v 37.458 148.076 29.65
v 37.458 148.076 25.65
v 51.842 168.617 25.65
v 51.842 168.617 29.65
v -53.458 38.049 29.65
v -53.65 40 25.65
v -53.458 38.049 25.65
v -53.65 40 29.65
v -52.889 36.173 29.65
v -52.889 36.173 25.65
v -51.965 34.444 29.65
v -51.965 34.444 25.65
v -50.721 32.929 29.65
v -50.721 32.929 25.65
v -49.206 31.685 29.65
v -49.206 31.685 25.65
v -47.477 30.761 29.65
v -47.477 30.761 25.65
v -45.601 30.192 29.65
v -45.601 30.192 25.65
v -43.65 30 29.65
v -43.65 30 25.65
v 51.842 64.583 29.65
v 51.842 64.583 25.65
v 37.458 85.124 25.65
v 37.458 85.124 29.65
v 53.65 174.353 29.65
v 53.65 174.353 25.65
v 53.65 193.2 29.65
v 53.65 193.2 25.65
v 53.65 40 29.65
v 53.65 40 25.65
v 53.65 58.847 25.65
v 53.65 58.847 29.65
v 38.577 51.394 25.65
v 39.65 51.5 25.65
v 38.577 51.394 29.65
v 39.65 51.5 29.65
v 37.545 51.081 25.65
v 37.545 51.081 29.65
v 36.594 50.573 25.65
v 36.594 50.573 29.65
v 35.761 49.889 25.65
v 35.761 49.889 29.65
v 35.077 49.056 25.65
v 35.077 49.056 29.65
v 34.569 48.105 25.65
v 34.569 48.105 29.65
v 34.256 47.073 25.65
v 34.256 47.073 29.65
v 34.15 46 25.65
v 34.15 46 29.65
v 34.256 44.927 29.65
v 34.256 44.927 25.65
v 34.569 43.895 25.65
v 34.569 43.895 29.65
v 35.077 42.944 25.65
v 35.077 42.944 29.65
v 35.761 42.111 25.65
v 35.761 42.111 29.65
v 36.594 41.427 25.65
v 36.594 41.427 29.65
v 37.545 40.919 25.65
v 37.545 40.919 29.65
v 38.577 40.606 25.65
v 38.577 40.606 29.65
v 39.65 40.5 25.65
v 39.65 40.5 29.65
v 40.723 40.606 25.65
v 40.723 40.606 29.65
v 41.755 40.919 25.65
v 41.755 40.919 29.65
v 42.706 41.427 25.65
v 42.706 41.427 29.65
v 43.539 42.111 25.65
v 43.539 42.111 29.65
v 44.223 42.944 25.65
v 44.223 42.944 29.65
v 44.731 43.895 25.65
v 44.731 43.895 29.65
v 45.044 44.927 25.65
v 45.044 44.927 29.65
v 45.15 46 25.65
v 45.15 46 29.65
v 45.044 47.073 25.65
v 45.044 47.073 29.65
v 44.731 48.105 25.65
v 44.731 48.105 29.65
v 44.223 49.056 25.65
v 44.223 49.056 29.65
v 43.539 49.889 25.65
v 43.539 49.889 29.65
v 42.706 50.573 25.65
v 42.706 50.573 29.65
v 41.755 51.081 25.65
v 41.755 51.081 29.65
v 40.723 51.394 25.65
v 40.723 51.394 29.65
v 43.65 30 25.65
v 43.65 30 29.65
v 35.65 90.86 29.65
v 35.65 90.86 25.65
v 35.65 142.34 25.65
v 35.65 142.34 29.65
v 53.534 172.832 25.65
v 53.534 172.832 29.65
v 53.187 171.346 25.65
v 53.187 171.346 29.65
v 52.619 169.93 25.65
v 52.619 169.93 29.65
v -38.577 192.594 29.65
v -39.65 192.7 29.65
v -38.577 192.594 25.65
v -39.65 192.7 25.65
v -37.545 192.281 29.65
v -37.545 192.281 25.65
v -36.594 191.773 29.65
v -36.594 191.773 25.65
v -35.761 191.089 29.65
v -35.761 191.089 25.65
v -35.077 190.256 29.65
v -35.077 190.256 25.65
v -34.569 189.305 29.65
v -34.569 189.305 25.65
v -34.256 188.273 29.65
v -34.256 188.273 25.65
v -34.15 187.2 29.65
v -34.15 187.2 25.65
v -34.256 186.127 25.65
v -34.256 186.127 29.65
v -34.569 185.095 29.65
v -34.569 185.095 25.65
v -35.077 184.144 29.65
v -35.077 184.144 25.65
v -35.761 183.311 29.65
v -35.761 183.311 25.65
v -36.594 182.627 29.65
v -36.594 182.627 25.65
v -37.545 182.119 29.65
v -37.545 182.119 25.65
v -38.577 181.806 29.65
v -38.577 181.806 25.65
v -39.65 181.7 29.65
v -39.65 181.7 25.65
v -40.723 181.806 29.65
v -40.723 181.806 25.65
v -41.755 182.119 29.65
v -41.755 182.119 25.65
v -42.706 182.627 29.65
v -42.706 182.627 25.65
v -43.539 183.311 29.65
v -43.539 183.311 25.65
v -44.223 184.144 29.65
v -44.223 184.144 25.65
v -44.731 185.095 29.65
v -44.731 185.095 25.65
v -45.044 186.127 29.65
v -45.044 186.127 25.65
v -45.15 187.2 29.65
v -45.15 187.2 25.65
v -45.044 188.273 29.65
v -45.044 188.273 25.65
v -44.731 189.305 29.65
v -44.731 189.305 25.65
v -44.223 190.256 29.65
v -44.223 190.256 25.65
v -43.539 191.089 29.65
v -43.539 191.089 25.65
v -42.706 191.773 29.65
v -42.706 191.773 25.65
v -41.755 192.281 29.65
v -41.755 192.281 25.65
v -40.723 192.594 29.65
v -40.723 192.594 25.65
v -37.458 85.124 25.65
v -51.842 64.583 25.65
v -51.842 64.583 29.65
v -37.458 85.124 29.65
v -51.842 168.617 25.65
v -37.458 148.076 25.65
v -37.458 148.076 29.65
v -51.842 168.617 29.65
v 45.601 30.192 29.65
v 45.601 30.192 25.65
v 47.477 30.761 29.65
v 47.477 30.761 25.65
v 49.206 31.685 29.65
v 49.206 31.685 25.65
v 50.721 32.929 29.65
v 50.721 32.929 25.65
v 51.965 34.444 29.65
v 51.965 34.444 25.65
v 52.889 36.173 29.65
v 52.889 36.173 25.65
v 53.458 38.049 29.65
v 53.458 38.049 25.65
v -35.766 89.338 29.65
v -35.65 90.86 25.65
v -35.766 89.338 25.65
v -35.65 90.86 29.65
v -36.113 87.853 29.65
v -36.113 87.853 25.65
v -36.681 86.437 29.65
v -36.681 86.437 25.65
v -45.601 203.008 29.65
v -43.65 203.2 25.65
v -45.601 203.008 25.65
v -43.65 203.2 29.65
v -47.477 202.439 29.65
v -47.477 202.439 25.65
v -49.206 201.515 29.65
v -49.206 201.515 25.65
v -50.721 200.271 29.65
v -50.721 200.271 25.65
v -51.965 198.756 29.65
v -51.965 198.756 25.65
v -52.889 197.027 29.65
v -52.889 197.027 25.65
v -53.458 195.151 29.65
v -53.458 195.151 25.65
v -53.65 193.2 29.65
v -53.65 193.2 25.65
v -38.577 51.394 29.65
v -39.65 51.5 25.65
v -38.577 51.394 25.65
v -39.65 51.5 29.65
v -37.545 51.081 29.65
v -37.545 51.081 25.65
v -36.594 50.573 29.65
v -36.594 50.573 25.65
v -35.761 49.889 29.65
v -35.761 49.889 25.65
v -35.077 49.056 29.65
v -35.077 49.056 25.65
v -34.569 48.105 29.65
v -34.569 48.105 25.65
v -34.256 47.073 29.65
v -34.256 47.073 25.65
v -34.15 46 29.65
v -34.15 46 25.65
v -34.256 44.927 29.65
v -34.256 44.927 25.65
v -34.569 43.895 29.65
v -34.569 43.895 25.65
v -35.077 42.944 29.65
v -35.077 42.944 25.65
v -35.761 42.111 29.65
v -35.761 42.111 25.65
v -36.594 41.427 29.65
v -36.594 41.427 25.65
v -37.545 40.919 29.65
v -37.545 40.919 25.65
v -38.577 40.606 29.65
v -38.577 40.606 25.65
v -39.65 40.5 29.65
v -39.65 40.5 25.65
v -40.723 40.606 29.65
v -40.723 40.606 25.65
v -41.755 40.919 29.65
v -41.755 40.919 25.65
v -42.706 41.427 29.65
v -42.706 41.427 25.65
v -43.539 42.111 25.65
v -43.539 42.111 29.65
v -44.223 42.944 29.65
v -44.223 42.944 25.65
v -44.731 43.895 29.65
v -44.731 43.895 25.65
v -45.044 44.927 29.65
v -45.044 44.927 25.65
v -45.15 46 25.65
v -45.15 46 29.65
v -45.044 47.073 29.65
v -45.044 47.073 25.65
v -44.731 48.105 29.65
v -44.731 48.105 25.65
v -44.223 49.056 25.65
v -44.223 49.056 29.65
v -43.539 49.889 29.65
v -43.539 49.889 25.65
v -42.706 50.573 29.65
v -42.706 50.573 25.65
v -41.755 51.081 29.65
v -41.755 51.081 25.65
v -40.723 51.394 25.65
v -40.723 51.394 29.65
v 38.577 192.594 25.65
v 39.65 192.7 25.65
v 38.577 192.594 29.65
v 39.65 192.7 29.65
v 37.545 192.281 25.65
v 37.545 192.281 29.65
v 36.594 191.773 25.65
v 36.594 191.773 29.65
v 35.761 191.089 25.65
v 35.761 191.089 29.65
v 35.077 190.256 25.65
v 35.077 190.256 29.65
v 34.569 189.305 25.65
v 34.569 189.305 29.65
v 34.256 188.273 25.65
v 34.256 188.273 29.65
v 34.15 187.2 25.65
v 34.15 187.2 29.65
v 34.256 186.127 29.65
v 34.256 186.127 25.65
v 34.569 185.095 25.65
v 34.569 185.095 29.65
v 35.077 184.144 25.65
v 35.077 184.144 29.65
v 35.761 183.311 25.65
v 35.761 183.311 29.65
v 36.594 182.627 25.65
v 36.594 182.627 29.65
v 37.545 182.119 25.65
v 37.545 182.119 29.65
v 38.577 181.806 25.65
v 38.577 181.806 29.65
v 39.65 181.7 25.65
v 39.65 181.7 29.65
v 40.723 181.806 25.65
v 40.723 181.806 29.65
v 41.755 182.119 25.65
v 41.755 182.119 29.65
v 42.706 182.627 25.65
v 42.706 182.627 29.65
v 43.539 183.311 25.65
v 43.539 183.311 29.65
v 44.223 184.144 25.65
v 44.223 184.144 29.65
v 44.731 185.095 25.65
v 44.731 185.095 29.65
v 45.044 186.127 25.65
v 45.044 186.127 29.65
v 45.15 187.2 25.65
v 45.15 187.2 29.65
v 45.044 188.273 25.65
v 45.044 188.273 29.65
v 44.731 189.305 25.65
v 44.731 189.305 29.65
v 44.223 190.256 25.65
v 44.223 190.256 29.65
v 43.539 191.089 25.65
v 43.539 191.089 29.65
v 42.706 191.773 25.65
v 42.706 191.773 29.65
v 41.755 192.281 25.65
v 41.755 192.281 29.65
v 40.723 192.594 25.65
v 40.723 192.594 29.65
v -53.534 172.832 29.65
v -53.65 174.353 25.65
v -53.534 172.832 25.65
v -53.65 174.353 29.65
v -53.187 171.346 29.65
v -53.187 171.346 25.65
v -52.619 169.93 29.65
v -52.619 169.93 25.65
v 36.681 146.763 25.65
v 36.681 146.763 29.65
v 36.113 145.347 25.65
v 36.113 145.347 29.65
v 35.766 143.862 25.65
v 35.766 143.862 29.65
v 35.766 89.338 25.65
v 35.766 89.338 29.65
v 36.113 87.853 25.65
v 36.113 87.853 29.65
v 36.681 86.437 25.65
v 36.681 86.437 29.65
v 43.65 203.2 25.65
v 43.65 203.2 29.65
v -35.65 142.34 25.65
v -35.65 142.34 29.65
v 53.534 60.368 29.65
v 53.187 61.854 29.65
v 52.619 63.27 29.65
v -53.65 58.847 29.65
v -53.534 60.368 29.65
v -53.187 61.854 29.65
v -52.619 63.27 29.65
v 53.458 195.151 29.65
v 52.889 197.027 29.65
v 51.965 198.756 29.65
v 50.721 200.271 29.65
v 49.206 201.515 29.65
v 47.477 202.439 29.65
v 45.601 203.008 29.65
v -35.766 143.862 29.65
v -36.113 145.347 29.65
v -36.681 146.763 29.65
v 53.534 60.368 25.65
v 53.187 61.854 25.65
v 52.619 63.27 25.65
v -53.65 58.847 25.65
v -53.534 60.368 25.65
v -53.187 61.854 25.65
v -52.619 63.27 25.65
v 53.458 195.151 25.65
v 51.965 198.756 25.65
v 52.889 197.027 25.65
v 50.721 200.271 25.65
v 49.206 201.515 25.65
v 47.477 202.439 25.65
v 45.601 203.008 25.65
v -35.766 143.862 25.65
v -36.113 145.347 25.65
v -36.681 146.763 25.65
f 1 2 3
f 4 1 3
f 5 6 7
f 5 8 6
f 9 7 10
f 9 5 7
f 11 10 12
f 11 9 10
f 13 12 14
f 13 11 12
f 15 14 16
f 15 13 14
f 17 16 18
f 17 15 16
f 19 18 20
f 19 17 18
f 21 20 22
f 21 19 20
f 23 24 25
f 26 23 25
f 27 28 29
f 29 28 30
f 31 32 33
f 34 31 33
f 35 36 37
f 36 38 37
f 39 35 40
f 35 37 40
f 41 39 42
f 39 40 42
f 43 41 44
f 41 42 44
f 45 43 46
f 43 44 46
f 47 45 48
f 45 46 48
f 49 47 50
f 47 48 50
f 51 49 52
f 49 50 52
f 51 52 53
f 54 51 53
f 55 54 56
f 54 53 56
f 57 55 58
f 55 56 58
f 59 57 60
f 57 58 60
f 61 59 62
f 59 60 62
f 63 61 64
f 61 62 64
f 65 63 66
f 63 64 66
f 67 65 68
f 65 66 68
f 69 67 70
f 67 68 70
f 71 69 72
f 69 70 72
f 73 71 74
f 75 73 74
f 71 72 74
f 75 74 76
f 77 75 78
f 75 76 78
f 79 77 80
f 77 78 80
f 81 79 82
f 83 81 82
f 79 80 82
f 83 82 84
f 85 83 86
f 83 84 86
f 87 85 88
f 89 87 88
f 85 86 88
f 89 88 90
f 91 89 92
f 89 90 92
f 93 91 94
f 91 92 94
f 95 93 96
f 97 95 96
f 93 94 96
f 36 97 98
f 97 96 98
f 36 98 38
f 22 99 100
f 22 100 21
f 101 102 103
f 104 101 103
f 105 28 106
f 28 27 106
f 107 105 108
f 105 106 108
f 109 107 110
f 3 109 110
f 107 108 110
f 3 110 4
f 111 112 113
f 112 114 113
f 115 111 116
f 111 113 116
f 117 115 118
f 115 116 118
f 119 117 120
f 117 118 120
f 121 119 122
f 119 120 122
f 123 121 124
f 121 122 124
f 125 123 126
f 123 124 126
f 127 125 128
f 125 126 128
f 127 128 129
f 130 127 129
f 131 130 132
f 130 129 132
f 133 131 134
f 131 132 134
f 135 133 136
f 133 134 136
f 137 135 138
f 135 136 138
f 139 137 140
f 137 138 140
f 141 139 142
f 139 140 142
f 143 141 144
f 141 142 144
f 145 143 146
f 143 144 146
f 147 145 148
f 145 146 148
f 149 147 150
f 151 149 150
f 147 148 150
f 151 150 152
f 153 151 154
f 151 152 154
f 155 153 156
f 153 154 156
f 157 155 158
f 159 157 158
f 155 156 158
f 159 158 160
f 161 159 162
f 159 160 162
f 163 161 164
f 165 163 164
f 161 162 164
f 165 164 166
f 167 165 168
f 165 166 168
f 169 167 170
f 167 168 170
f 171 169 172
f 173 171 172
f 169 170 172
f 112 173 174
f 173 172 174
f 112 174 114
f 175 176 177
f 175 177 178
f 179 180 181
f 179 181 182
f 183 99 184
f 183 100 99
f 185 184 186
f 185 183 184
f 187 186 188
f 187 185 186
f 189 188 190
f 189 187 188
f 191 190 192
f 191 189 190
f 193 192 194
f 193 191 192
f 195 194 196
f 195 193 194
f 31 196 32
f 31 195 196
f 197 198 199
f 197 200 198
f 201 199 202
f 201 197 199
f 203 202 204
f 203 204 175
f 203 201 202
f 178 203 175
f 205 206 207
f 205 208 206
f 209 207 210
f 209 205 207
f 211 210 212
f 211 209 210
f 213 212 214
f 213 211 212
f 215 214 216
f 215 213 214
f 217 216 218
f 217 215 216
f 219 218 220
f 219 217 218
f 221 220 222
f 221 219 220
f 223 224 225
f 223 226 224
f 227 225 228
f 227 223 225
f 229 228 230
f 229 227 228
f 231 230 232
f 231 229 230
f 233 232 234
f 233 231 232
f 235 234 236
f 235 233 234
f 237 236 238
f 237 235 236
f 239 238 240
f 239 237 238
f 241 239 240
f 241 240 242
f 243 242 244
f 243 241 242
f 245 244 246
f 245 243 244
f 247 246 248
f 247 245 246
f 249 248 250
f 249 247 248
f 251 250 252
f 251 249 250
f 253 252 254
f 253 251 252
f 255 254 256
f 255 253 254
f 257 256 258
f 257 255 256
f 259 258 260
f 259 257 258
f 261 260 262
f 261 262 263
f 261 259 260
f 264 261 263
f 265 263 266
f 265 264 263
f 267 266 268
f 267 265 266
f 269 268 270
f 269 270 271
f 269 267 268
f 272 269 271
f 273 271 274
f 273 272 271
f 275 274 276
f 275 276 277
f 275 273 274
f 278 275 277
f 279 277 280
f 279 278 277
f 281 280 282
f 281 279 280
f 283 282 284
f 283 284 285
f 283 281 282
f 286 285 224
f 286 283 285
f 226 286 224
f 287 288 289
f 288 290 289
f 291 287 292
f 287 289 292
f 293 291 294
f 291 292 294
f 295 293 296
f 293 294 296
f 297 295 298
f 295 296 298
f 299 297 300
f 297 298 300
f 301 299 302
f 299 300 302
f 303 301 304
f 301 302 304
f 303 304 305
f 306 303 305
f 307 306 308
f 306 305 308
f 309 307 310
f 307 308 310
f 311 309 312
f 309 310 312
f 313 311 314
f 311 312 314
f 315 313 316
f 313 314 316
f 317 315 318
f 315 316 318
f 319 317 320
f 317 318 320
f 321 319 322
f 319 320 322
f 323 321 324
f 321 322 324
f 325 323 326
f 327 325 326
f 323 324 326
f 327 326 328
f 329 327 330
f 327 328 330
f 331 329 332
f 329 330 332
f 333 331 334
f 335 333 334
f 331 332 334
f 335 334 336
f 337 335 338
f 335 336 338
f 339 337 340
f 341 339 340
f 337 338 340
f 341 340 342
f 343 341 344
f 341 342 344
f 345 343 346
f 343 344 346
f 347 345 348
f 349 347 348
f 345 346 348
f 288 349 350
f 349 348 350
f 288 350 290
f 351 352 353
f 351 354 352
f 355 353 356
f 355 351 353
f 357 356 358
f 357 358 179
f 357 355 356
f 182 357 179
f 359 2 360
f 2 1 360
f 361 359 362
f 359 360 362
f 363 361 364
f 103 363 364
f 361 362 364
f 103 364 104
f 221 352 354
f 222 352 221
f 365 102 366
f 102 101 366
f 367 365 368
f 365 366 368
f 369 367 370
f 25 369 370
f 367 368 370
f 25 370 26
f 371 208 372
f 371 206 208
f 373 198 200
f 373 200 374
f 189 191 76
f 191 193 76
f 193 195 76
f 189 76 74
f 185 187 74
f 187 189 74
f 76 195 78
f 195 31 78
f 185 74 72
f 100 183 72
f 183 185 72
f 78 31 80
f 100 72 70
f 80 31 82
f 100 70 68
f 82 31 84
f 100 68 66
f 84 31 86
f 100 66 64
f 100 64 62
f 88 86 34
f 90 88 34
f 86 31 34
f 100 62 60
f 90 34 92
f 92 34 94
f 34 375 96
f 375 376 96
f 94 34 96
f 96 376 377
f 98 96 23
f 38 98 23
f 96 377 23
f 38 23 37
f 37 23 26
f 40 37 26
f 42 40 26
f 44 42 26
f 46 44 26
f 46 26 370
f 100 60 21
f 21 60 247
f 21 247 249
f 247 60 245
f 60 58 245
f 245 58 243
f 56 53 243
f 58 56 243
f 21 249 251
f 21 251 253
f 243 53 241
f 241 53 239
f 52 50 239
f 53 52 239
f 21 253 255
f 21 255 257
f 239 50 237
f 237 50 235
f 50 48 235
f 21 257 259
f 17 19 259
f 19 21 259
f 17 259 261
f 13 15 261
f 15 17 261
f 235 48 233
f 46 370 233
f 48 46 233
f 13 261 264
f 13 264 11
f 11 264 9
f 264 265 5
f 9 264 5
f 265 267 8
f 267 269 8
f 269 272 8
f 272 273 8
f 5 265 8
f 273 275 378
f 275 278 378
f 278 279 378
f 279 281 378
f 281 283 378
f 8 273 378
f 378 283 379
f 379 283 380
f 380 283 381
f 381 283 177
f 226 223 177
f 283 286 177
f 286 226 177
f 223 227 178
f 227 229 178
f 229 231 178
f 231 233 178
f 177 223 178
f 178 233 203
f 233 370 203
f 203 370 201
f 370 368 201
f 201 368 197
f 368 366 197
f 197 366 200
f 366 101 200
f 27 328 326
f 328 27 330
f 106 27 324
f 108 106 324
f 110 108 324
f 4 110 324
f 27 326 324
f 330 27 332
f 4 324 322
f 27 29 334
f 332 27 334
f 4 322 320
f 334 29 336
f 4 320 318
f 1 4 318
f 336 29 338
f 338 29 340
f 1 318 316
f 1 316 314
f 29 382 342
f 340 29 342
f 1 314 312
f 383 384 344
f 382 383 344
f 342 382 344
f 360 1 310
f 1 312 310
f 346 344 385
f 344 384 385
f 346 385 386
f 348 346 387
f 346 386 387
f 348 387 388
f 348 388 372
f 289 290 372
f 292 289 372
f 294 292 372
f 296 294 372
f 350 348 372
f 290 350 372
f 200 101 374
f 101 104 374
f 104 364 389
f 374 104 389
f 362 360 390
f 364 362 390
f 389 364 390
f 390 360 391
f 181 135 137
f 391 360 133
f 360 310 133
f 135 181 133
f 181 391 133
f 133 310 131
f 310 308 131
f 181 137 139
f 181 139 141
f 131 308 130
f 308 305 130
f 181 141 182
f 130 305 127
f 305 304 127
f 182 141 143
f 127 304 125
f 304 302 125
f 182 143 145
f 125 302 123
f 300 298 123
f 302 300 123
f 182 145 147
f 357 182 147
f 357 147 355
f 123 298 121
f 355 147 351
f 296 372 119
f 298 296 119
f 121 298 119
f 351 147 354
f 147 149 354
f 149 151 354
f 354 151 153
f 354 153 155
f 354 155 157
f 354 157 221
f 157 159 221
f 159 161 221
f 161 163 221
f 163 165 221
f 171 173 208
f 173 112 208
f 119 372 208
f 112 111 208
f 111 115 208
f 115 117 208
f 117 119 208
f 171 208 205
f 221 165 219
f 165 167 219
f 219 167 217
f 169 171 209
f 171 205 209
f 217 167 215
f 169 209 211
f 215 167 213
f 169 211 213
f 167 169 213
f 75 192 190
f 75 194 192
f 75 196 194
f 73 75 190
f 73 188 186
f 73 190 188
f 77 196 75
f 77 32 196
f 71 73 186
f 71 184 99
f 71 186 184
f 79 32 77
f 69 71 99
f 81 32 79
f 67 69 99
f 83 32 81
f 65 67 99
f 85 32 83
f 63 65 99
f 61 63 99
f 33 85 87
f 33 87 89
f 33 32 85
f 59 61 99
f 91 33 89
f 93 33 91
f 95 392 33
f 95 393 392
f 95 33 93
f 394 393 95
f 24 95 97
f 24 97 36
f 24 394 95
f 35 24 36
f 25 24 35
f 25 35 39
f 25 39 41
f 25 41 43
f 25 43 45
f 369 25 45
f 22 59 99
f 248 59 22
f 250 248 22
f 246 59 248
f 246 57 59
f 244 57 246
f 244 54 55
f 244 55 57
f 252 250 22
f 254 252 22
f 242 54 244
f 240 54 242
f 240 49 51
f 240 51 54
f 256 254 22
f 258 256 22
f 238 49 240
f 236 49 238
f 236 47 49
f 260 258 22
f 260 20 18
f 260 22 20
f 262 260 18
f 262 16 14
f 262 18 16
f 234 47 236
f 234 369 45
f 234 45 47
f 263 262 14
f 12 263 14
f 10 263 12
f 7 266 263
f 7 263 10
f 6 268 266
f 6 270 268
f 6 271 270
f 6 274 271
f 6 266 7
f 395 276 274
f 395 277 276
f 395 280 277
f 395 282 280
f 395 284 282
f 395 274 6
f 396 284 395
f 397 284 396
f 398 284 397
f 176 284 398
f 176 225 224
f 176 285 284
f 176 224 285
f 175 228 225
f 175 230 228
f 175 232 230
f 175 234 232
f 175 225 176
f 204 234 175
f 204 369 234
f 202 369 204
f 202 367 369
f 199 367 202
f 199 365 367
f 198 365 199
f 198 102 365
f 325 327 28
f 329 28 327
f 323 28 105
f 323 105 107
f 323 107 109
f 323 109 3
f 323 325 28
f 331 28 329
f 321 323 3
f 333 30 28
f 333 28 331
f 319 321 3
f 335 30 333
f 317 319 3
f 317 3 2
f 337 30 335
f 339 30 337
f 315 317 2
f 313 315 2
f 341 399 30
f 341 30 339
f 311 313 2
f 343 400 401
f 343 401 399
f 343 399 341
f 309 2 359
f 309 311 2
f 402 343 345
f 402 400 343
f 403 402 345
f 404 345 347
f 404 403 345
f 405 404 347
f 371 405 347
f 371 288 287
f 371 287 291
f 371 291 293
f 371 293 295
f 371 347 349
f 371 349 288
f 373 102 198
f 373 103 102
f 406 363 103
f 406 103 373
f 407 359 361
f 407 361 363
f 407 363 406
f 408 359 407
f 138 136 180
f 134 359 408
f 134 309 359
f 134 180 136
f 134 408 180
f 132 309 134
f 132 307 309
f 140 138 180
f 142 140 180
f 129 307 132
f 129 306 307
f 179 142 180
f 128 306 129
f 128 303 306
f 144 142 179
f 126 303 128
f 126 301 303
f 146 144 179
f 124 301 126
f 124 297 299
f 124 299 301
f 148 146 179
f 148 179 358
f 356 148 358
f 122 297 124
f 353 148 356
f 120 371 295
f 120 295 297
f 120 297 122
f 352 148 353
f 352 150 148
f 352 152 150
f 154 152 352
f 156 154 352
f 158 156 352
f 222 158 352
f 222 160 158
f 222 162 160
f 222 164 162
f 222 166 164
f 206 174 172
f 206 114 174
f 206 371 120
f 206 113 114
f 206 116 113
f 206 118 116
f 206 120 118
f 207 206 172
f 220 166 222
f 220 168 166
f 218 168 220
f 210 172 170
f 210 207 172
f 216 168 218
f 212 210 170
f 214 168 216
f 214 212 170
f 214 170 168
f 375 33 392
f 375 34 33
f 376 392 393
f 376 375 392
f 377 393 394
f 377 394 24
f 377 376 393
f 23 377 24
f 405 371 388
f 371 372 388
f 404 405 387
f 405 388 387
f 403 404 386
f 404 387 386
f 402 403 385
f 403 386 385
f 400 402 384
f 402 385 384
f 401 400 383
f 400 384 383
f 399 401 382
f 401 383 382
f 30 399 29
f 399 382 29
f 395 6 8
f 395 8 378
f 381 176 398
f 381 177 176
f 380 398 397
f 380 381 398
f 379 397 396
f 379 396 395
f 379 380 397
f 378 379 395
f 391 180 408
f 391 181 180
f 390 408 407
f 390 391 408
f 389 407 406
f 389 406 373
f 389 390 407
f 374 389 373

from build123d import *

# Parameters (mm, degrees)
SKETCH12_W                     = 4.57134
SKETCH12_H                     = 203.2
BOSS_EXTRUDE1_START            = -173.2
BOSS_EXTRUDE1_DEPTH            = 173.2
BOSS_EXTRUDE2_DEPTH            = 4
SKETCH29_W                     = 5.5
SKETCH29_H                     = 4
M10_CLEARANCE_HOLE1_AT_2_COUNT = 2
M10_CLEARANCE_HOLE1_AT_2_PITCH = 141.2
FILLET1_R                      = 10
MIRROR1_COPY_1_SKETCH_W        = 5.5
MIRROR1_COPY_1_SKETCH_H        = 4
FILLET1_OF_MIRROR1_R           = 10


with BuildPart() as part:
    # Sketch12 → Revolve1 (revolve)
    with BuildSketch(Plane.XY, mode=Mode.PRIVATE) as revolve1_sk:
        with Locations((-23.36433, 101.6)):
            Rectangle(SKETCH12_W, SKETCH12_H)
    revolve(revolve1_sk.sketch.rotate(Axis((0, 0, 0), (0, 1, 0)), 270), axis=Axis((0, 0, 0), (0, 1, 0)))

    # Sketch14 → Boss-Extrude1 (add)
    with BuildSketch(Plane(origin=(0, 30, 0), x_dir=(-1, 0, 0), z_dir=(0, -1, 0)).offset(BOSS_EXTRUDE1_START)):
        with BuildLine():
            Line((-25.65, 0), (-25.65, -25.65))
            Line((-25.65, -25.65), (1.5e-08, -25.65))
            ThreePointArc((1.5e-08, -25.65), (-18.137288932, -18.137288943), (-25.65, 0))
        make_face()
        with BuildLine():
            ThreePointArc((25.65, 0), (18.137288943, -18.137288932), (1.5e-08, -25.65))
            Line((1.5e-08, -25.65), (25.65, -25.65))
            Line((25.65, -25.65), (25.65, 0))
        make_face()
    extrude(amount=BOSS_EXTRUDE1_DEPTH)


with BuildPart() as body_2:
    # Sketch27 → Boss-Extrude2 (new body)
    with BuildSketch(Plane.XY.offset(25.65)):
        Polygon((53.65, 203.2), (-25.65, 203.2), (-25.65, 30), (53.65, 30), (53.65, 62), (35.65, 87.706664121), (35.65, 145.493335879), (53.65, 171.2), align=None)
    boss_extrude2 = extrude(amount=BOSS_EXTRUDE2_DEPTH)

    # Sketch29 → M10 Clearance Hole1 (revolve, cut)
    with BuildSketch(Plane(origin=(39.65, 46, 25.65), x_dir=(0, 1, 0), z_dir=(1, 0, 0))):
        with Locations((2.75, 2)):
            Rectangle(SKETCH29_W, SKETCH29_H)
    m10_clearance_hole1 = revolve(axis=Axis((39.65, 46, 19.3), (0, 0, 1)), mode=Mode.SUBTRACT)

    # M10 Clearance Hole1 at 2: M10 Clearance Hole1 ×2
    with Locations(*[(0, i * M10_CLEARANCE_HOLE1_AT_2_PITCH, 0) for i in range(1, M10_CLEARANCE_HOLE1_AT_2_COUNT)]):
        add(m10_clearance_hole1, mode=Mode.SUBTRACT)

    # Fillet1
    fillet1_edges = [body_2.edges().sort_by_distance(p)[0] for p in [
        (53.65, 203.2, 27.65),
        (53.65, 171.2, 27.65),
        (35.65, 145.493335879, 27.65),
        (35.65, 87.706664121, 27.65),
        (53.65, 62, 27.65),
        (53.65, 30, 27.65),
    ]]
    fillet(fillet1_edges, radius=FILLET1_R)

    # Mirror1: Boss-Extrude2, M10 Clearance Hole1 across plane
    add(boss_extrude2.mirror(Plane(origin=(0, 0, 0), x_dir=(0, 0, 1), z_dir=(1, 0, 0))))
    add(m10_clearance_hole1.mirror(Plane(origin=(0, 0, 0), x_dir=(0, 0, 1), z_dir=(1, 0, 0))), mode=Mode.SUBTRACT)

    # Mirror1 copy 1 sketch → Mirror1 copy 1 (revolve, cut)
    with BuildSketch(Plane(origin=(-39.65, 187.2, 25.65), x_dir=(0, 1, 0), z_dir=(-1, 0, 0))):
        with Locations((2.75, -2)):
            Rectangle(MIRROR1_COPY_1_SKETCH_W, MIRROR1_COPY_1_SKETCH_H)
    revolve(axis=Axis((-39.65, 187.2, 19.3), (0, 0, -1)), mode=Mode.SUBTRACT)

    # Fillet1 of Mirror1
    fillet1_of_mirror1_edges = [body_2.edges().sort_by_distance(p)[0] for p in [
        (-53.65, 203.2, 27.65),
        (-53.65, 171.2, 27.65),
        (-35.65, 145.493335879, 27.65),
        (-35.65, 87.706664121, 27.65),
        (-53.65, 62, 27.65),
        (-53.65, 30, 27.65),
    ]]
    fillet(fillet1_of_mirror1_edges, radius=FILLET1_OF_MIRROR1_R)


solid = body_2.part
